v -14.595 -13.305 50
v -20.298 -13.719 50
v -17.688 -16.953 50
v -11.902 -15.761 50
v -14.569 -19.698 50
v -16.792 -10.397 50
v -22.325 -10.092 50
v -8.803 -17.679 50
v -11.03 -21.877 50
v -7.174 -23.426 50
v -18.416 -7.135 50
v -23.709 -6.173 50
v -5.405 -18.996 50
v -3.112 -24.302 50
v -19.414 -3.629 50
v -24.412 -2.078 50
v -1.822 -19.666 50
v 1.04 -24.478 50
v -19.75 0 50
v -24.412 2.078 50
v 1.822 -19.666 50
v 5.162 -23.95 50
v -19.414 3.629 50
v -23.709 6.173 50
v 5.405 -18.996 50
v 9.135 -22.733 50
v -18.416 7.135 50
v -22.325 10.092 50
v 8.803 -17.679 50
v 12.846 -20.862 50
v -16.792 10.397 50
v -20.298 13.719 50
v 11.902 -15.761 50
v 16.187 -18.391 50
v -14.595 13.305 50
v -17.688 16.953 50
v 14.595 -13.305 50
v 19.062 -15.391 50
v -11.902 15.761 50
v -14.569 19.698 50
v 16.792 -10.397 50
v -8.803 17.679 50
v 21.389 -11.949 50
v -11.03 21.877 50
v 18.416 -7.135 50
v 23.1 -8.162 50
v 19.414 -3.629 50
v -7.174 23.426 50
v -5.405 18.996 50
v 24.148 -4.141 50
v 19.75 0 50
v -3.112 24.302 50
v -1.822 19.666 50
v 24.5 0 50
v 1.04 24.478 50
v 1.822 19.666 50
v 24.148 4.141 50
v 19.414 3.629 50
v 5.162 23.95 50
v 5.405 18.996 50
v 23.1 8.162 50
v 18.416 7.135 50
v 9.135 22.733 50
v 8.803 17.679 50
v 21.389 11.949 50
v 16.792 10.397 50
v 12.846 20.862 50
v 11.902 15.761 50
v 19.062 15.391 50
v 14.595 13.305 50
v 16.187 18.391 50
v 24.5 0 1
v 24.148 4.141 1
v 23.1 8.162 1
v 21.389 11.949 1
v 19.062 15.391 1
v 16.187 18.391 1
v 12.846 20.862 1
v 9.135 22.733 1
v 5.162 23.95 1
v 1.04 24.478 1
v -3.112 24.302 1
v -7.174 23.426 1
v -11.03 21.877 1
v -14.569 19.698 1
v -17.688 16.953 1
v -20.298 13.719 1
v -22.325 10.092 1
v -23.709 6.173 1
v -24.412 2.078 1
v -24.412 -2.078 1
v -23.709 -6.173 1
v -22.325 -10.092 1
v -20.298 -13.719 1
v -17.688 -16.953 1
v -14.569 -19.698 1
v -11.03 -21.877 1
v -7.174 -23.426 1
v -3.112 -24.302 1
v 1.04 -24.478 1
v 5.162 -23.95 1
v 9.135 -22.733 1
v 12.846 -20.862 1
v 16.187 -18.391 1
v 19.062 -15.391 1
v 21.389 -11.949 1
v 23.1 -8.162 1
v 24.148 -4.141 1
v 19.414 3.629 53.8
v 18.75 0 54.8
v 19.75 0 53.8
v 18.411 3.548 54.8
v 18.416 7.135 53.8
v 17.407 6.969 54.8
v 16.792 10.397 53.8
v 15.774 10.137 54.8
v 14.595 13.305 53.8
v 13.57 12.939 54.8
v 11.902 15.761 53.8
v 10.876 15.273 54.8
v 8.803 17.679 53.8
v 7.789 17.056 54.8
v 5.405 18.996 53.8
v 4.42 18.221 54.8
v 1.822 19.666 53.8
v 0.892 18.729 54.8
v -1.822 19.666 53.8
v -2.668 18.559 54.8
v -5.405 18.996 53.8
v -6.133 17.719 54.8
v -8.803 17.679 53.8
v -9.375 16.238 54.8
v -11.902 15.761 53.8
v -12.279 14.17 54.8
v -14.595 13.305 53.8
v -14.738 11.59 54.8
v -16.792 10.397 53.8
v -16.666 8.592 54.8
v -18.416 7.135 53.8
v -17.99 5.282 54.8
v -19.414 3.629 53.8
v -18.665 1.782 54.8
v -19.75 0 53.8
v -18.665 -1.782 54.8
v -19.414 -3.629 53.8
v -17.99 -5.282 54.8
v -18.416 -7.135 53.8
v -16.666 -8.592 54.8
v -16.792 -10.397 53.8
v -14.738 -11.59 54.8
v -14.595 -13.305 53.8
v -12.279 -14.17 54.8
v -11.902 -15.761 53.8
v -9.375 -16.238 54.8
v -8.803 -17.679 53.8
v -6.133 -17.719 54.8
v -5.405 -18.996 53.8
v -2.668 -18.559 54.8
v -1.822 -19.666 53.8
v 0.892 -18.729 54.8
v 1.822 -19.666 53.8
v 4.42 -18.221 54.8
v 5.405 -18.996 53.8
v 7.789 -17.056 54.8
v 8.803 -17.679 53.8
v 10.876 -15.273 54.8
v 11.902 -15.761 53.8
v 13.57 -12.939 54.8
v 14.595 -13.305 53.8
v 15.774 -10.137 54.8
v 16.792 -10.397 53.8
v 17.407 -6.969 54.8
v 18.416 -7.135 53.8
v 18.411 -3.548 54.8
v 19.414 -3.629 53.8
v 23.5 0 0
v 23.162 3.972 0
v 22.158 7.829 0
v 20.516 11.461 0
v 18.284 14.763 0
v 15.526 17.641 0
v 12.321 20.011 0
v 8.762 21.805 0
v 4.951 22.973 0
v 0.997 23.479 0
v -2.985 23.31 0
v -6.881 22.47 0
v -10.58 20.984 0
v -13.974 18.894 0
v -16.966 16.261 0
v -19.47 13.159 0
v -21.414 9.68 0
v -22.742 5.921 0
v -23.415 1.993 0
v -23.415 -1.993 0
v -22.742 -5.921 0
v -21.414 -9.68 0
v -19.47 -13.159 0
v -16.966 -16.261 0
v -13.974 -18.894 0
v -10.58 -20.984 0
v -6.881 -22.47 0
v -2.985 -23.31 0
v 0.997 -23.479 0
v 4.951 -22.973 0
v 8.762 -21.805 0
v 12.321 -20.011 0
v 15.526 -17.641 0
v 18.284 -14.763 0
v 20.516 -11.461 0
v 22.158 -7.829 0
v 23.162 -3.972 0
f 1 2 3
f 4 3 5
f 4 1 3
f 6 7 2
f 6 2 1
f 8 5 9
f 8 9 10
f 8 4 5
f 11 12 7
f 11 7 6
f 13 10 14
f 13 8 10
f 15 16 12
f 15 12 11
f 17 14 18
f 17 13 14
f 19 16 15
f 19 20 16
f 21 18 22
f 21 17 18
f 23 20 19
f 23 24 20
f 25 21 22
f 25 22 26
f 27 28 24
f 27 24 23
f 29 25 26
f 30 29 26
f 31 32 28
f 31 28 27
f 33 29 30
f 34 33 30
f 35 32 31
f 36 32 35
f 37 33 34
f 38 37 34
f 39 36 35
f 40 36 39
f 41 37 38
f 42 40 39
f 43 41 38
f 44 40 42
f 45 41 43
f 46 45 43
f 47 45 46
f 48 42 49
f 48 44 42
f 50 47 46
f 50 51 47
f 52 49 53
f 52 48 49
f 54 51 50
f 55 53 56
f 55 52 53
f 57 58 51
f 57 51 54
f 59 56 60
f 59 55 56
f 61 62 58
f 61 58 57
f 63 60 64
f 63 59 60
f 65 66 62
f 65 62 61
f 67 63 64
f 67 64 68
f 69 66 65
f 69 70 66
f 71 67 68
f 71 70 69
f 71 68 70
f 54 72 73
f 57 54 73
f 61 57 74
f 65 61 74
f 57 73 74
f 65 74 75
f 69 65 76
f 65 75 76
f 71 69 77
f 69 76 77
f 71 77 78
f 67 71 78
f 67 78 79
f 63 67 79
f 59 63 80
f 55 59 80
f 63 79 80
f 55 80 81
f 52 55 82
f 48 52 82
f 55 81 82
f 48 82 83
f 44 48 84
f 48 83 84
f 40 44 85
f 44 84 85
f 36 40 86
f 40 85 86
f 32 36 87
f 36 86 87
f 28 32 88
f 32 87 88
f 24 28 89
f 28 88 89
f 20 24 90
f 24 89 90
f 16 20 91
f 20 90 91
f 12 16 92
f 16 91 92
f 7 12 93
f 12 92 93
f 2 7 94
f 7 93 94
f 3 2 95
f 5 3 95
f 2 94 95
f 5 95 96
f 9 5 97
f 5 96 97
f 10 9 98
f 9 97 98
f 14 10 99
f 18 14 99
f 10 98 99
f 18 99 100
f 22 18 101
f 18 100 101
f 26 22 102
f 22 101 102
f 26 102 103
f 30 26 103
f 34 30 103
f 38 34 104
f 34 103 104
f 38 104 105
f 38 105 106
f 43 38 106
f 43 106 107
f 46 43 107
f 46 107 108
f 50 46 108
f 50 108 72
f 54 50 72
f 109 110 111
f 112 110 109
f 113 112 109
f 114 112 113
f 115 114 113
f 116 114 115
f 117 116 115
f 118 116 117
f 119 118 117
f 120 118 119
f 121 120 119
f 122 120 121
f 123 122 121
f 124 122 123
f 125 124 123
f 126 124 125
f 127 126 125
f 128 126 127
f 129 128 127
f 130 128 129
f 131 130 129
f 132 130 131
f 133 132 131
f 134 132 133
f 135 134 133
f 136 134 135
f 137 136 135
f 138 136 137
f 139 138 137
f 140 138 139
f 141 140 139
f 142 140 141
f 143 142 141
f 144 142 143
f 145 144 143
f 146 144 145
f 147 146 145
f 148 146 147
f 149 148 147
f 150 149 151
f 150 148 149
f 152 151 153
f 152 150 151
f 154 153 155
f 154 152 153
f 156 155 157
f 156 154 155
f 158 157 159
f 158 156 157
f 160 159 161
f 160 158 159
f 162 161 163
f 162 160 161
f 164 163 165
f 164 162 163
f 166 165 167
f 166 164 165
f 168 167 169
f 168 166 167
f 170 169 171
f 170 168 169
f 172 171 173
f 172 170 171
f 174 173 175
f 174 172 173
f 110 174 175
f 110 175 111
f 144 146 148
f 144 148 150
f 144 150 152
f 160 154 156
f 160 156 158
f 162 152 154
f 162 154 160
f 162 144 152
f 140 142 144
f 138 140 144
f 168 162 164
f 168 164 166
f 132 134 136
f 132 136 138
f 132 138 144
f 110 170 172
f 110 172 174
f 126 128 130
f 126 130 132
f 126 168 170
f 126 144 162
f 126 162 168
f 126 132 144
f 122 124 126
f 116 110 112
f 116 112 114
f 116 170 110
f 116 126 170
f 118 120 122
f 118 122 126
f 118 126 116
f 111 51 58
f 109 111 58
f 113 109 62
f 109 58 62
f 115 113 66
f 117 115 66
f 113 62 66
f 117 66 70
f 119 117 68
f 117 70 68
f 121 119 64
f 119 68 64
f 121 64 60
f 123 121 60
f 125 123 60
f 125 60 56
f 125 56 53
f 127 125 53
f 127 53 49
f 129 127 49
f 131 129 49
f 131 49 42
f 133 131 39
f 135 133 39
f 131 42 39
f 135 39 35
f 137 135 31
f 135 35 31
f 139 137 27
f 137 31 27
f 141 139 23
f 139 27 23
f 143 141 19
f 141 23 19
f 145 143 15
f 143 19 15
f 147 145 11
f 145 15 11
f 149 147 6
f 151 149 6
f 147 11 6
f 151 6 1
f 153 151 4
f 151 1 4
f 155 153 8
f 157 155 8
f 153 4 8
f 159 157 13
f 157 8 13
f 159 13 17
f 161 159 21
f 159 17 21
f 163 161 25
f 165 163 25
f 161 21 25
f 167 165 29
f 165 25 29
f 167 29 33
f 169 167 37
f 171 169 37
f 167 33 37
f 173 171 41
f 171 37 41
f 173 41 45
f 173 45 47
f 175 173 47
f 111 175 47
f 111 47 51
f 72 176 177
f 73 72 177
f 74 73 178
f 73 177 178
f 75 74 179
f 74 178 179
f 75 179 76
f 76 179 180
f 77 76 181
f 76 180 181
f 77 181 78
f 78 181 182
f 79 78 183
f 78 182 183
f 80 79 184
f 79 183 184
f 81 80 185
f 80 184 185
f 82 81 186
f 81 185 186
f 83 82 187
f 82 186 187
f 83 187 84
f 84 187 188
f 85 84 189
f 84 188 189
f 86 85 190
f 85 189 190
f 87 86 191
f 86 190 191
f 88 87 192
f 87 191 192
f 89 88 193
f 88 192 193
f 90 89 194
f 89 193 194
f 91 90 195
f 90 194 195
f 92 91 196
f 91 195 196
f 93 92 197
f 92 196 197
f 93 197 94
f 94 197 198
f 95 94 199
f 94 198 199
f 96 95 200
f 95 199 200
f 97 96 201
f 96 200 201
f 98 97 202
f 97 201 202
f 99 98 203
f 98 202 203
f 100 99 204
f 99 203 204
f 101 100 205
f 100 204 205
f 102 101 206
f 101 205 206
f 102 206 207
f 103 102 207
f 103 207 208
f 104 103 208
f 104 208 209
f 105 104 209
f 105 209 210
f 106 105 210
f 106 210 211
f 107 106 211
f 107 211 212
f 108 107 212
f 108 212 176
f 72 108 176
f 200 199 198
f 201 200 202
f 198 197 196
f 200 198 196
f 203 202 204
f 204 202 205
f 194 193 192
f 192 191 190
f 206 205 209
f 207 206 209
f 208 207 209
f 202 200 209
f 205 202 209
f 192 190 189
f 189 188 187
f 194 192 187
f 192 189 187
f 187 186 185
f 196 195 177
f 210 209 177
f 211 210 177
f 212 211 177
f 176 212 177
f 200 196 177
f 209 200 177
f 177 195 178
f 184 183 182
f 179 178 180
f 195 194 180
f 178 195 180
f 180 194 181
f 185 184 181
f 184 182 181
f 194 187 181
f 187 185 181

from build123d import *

# Parameters (mm, degrees)
F0_R     = 24.5
F1_DEPTH = 50
F2_R     = 19.75
F3_DEPTH = 4.8
F4_SIZE  = 1


with BuildPart() as f1:
    # F0 (on Top) → F1 (new body)
    with BuildSketch(Plane.XY):
        Circle(F0_R)
    extrude(amount=F1_DEPTH)

    # F2 (on face) → F3 (join)
    with BuildSketch(Plane.XY.offset(50)):
        Circle(F2_R)
    extrude(amount=F3_DEPTH)

    # F4
    f4_edges = [f1.edges().sort_by_distance(p)[0] for p in [
        (-24.5, 0, 0),
        (-19.75, 0, 54.8),
    ]]
    chamfer(f4_edges, length=F4_SIZE)


solid = f1.part
